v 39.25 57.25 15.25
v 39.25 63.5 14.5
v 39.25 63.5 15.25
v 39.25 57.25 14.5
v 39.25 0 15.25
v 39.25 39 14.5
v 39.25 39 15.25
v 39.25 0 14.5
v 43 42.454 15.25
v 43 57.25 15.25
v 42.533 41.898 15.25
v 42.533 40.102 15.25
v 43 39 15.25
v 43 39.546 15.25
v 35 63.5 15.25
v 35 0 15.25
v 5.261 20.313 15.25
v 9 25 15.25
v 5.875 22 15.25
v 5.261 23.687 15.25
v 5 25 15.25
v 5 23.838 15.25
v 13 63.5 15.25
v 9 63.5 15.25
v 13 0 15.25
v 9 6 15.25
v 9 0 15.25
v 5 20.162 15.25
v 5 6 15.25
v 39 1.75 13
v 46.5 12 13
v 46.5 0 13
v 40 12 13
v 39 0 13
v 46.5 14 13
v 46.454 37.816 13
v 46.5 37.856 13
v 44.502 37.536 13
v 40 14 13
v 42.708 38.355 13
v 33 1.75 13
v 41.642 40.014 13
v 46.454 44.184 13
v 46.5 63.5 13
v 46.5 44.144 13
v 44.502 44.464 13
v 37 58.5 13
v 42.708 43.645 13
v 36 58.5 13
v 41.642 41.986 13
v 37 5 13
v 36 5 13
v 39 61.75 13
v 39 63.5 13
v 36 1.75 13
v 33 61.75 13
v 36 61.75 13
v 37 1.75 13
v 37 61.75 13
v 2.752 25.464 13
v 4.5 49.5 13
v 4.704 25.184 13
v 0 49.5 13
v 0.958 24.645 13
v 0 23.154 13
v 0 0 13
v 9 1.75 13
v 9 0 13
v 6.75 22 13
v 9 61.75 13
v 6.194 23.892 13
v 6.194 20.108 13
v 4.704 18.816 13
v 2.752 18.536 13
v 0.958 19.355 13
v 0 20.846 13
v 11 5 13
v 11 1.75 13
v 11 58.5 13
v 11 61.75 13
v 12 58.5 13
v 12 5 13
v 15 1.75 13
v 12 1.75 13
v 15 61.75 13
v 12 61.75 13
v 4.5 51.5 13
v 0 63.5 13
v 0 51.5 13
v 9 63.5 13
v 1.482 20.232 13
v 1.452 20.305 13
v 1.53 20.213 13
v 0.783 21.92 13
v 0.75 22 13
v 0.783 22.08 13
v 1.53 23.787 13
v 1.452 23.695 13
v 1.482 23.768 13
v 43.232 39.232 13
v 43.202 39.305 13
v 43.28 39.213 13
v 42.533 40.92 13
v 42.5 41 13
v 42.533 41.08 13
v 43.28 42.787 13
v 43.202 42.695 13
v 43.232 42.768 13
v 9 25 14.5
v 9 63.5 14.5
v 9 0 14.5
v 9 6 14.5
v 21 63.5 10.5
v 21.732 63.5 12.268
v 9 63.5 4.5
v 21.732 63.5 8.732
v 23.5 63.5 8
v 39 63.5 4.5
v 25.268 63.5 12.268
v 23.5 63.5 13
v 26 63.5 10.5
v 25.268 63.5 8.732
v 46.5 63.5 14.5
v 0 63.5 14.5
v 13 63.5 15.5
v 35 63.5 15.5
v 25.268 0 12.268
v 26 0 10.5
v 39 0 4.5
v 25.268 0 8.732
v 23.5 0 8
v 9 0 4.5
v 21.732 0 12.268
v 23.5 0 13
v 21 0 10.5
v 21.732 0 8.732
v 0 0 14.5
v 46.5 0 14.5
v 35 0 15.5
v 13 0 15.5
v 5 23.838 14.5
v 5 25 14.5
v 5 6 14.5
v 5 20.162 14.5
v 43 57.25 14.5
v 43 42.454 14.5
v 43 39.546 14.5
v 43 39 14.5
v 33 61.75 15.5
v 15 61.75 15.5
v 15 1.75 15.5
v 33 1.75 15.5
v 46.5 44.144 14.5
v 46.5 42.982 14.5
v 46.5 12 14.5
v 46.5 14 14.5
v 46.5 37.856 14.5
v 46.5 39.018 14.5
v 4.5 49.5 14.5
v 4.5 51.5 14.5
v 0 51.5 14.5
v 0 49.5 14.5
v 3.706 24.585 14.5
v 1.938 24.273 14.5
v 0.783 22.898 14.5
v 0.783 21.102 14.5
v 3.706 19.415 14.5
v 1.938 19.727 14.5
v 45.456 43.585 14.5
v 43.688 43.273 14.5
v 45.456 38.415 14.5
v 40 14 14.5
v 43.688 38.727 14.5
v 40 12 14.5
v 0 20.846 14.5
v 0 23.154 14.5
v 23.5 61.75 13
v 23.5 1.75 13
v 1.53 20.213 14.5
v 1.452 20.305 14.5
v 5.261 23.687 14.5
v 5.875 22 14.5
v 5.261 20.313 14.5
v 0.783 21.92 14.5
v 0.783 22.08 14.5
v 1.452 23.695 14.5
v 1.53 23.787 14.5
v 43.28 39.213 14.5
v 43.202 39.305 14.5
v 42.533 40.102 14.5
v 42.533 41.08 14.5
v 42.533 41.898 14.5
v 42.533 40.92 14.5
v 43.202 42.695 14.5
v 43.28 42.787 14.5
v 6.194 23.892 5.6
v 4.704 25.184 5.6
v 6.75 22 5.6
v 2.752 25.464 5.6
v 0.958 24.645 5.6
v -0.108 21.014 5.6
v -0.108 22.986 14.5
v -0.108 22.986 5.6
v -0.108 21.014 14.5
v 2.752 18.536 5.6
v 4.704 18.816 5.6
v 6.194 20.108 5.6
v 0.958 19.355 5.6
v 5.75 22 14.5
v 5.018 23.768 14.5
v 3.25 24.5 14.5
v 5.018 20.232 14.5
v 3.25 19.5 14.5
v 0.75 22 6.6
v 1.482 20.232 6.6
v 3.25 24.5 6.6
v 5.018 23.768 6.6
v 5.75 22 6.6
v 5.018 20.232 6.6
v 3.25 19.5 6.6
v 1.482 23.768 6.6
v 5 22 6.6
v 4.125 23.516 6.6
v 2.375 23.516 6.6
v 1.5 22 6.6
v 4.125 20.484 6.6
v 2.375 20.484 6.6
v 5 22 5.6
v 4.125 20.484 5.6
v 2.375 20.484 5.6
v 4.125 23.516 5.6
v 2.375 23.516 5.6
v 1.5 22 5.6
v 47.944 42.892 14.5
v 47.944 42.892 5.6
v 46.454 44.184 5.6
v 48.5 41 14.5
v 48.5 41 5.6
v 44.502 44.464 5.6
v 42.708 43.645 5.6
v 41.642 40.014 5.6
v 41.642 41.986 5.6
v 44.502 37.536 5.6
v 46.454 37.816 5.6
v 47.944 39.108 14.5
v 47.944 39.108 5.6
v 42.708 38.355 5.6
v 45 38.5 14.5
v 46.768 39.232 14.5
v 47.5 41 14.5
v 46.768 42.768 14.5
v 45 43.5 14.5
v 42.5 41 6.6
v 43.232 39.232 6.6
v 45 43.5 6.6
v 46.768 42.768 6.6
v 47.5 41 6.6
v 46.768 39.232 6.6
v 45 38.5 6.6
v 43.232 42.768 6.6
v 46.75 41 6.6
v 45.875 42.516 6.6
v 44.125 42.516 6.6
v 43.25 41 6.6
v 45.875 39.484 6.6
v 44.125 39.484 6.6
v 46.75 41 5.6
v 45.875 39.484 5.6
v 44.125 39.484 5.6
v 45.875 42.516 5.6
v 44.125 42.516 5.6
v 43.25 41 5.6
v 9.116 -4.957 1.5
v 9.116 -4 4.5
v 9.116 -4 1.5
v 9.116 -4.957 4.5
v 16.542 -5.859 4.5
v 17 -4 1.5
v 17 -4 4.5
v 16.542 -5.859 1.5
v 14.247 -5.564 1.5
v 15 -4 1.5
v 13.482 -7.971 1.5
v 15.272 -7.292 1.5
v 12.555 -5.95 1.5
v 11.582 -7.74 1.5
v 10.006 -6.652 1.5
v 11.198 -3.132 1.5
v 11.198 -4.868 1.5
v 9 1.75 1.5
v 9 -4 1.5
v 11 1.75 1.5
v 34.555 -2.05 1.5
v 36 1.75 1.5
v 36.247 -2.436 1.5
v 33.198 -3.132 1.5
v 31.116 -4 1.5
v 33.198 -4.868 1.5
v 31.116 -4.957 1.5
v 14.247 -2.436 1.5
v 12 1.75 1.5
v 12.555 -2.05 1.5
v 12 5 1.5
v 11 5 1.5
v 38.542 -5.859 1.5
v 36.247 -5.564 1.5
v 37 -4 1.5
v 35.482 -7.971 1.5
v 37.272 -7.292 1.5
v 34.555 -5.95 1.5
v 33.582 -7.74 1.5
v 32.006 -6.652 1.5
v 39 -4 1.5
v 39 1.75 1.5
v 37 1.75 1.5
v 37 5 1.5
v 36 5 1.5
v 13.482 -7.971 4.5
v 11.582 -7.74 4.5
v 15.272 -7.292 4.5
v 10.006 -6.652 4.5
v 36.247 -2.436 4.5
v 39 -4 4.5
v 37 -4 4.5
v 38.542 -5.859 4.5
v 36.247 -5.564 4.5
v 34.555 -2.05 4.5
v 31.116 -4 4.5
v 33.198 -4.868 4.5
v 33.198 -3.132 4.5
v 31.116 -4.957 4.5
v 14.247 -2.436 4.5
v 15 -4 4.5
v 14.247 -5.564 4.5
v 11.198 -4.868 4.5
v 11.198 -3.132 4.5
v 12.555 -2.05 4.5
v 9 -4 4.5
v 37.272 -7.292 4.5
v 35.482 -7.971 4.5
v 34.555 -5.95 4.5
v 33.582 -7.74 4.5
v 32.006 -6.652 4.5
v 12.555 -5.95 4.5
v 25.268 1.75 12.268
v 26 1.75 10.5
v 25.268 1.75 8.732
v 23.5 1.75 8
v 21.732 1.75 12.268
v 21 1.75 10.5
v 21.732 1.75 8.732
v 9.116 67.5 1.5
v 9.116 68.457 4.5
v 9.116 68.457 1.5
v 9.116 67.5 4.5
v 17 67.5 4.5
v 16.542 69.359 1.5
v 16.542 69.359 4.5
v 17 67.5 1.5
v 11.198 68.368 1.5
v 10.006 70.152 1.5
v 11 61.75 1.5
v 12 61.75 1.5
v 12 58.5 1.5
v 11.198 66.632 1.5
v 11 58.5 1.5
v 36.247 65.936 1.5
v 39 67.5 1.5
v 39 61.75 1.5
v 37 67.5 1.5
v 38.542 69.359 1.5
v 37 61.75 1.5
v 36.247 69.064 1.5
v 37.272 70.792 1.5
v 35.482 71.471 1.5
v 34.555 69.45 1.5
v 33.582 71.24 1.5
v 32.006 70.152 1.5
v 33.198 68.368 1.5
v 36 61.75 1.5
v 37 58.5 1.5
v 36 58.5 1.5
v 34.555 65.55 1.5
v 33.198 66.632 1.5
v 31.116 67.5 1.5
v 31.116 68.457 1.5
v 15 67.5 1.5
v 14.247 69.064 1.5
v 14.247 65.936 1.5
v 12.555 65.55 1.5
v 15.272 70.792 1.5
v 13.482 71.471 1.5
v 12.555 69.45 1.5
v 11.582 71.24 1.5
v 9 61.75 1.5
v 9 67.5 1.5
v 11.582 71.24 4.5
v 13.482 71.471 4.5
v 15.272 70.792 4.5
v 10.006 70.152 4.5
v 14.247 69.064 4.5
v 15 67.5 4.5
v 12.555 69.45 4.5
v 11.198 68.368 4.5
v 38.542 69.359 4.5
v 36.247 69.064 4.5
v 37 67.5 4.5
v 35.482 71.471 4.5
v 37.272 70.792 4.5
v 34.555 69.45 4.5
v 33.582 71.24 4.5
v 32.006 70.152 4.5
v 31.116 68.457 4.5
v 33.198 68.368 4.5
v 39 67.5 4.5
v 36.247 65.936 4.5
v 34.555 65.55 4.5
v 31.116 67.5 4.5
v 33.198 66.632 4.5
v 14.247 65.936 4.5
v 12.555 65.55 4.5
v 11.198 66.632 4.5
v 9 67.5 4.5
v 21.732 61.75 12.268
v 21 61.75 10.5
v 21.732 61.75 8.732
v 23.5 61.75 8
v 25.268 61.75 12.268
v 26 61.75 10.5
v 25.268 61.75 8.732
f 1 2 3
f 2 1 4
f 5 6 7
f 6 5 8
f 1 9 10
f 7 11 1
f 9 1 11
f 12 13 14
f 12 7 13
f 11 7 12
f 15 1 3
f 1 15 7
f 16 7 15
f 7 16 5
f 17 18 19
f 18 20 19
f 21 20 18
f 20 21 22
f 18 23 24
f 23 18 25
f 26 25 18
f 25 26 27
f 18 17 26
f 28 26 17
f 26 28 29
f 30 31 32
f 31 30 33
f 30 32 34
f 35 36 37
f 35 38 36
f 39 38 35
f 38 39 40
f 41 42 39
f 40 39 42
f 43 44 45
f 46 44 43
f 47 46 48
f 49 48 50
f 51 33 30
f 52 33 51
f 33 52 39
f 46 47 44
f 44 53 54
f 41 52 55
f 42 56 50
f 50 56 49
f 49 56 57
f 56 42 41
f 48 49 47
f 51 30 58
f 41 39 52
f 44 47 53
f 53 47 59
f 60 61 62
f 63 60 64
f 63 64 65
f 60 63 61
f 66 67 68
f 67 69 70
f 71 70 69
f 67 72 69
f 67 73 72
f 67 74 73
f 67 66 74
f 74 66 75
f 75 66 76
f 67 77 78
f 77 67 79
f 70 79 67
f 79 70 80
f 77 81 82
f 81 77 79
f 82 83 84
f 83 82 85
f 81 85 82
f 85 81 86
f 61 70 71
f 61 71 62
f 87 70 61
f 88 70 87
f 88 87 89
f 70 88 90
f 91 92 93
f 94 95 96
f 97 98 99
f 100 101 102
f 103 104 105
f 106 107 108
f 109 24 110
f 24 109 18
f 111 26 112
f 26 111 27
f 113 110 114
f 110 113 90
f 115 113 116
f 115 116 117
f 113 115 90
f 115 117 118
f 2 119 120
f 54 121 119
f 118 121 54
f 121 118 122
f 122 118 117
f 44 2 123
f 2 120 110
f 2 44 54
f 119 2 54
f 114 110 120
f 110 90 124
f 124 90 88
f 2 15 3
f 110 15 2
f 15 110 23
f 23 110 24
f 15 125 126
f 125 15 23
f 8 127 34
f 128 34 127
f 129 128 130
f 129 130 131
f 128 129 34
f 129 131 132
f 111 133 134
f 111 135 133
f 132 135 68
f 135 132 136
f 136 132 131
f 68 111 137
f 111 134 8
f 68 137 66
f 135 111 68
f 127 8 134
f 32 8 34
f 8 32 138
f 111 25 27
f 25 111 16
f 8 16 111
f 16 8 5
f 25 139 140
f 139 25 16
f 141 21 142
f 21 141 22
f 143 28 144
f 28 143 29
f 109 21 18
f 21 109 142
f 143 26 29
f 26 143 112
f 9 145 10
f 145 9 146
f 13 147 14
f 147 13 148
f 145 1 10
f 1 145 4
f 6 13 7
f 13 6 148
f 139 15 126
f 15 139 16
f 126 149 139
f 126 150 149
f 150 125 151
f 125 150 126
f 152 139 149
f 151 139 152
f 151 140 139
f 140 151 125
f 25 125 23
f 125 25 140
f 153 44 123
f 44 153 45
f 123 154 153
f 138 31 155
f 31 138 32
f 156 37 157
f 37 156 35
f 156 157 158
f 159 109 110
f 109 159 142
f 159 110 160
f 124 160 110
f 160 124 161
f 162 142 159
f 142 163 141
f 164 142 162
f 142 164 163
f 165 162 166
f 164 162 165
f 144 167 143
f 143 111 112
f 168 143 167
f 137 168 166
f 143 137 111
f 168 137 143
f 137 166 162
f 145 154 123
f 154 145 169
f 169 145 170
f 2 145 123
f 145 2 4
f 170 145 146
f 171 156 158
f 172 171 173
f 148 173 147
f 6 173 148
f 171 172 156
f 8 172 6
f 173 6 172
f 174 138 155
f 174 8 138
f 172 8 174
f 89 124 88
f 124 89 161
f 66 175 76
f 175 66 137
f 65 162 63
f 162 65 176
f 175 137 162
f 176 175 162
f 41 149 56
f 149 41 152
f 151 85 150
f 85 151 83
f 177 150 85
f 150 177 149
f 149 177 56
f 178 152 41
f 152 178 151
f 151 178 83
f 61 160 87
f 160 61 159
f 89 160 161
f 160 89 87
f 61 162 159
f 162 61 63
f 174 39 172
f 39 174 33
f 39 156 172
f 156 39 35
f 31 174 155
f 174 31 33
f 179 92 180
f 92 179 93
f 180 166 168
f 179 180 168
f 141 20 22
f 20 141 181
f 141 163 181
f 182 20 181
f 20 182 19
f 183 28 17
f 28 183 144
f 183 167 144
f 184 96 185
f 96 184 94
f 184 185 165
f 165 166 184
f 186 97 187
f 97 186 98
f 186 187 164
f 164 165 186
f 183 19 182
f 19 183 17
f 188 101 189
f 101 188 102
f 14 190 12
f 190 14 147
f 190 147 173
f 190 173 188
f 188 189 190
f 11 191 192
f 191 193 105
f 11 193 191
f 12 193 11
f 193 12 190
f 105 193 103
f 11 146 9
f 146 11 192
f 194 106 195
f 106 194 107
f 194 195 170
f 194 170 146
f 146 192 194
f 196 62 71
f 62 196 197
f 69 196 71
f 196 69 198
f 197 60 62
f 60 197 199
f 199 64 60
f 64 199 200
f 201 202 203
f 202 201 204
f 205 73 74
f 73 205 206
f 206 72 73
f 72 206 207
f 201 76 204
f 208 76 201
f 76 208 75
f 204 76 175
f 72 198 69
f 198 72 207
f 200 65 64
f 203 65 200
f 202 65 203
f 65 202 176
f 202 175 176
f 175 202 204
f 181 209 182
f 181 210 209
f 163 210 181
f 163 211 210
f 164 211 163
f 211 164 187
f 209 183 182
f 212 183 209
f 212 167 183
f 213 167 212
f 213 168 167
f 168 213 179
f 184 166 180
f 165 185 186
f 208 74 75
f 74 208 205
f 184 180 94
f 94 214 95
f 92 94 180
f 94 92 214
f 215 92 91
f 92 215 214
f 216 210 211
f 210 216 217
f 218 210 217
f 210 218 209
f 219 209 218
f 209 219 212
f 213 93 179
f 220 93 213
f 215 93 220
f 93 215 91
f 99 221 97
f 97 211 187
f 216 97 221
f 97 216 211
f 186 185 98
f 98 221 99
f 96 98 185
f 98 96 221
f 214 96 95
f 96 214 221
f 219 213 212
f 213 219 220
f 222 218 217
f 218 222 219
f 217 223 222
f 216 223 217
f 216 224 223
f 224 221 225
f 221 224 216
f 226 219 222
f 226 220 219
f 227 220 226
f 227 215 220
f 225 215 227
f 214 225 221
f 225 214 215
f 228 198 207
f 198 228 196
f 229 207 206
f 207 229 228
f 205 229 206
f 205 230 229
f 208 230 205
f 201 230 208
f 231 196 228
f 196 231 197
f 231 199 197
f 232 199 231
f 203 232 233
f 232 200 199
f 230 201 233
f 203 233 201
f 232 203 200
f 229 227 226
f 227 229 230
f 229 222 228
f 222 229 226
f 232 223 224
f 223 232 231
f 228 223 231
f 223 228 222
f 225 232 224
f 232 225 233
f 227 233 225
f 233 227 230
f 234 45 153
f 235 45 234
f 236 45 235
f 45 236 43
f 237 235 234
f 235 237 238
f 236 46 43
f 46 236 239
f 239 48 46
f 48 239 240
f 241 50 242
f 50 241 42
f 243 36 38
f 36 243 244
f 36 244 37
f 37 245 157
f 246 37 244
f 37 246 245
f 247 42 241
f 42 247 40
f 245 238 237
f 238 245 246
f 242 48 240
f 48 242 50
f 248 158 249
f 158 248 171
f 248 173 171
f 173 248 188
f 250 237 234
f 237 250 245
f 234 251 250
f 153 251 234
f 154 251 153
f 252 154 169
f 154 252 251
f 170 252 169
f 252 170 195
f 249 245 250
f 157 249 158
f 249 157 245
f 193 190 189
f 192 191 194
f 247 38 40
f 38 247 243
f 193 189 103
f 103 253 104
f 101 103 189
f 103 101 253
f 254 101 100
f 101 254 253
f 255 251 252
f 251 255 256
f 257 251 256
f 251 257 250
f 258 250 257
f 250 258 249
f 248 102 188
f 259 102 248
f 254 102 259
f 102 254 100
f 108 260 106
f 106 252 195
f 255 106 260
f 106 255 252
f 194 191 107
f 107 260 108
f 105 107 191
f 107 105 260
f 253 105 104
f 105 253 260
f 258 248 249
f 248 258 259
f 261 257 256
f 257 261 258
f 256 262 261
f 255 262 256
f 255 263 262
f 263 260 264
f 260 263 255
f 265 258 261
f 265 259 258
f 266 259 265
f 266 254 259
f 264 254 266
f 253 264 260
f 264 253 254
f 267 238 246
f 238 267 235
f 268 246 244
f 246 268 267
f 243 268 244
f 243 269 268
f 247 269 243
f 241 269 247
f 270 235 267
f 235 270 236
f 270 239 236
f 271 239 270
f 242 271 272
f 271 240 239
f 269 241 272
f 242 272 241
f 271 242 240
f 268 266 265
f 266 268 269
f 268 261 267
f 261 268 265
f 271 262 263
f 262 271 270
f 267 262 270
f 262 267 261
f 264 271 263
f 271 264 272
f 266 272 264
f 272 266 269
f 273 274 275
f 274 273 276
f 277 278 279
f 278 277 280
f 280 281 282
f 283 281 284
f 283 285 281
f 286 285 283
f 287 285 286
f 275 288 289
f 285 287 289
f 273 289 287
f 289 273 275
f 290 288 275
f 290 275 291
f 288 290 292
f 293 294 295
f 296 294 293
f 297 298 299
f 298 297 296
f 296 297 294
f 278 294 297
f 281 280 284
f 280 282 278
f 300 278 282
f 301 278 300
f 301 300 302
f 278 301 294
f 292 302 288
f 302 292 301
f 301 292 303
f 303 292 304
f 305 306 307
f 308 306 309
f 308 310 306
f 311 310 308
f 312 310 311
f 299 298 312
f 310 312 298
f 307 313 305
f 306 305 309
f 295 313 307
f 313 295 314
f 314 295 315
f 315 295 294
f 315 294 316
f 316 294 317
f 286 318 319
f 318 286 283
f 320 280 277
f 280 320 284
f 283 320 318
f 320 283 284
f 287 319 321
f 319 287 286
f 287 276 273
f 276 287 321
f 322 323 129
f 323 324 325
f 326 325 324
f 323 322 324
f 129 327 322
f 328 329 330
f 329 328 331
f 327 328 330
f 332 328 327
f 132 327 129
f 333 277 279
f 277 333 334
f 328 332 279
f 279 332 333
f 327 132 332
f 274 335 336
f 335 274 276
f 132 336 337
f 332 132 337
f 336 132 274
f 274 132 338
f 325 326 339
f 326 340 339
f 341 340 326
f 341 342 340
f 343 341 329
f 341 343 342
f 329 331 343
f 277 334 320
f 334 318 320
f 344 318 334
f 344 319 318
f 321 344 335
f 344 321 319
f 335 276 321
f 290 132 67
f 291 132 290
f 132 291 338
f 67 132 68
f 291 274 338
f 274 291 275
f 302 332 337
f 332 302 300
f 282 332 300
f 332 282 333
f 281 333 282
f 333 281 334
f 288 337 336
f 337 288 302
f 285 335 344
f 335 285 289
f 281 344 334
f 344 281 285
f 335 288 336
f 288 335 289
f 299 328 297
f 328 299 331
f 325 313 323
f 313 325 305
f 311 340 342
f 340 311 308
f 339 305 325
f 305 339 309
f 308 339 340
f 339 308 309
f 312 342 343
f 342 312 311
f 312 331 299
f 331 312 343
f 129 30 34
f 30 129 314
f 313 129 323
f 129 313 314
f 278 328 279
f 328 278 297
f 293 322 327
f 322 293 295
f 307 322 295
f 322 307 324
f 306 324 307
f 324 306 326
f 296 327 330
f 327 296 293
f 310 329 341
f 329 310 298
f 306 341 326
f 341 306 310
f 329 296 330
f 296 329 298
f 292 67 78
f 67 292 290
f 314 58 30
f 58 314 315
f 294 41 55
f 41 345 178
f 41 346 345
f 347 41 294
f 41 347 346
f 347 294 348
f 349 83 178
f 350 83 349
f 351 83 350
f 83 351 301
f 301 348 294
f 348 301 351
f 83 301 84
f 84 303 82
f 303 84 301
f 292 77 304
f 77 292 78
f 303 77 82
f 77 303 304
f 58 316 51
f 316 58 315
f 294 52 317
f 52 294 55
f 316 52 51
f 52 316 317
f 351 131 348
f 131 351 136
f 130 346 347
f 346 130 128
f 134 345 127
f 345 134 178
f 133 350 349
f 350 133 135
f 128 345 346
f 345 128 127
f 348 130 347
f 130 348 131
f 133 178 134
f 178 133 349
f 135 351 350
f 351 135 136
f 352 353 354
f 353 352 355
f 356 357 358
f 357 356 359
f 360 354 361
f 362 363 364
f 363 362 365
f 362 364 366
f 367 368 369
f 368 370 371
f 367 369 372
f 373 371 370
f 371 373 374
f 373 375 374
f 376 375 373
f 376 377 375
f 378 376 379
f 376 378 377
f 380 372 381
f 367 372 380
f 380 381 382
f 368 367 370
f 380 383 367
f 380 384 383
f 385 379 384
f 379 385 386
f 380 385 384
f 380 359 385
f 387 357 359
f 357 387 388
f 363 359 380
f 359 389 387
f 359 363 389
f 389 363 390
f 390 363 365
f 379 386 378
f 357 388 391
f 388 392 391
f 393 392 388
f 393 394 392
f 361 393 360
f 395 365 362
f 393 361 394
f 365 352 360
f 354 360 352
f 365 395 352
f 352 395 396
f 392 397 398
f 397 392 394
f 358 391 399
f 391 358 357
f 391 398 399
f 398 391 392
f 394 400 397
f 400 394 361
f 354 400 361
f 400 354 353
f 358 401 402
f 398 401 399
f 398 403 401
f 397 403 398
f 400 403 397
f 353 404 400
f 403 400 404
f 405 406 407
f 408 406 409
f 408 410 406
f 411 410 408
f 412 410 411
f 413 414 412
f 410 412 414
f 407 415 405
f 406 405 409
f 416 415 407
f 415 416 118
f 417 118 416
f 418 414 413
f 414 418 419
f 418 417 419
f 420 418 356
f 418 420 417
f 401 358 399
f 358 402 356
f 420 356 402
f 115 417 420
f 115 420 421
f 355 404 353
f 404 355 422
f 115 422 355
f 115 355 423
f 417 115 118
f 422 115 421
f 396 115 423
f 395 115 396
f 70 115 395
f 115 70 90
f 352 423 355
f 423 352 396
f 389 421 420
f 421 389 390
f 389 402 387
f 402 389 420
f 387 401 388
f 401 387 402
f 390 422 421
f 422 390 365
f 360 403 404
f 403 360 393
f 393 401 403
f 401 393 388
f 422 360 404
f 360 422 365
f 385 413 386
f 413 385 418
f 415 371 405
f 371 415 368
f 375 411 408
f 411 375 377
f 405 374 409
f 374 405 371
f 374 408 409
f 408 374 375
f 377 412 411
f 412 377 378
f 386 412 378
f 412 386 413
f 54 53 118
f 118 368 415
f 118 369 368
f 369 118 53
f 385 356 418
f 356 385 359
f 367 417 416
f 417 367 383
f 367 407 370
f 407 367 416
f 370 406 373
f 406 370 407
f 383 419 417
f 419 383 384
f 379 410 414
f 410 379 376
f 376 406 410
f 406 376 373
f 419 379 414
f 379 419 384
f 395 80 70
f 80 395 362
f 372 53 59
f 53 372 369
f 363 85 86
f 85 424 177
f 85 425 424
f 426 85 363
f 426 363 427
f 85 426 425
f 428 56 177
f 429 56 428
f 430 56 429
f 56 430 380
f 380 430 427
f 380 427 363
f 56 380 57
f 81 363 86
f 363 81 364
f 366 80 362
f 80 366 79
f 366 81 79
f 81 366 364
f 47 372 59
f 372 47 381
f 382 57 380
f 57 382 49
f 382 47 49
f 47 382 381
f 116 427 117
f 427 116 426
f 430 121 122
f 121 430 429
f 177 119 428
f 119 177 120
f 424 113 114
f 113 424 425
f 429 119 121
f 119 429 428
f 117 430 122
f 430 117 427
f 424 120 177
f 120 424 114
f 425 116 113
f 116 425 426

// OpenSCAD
// file: screwbracket.scad
module raisedScrewHole(height) {
    difference() {
        union() {
            cylinder(height, r=4);
            translate([-4, 0, 0]) cube([8, 4, height], false);
        }
        
        // translate([0, 0, 1]) cylinder(2, r=3);
        cylinder(height, r=2);
    }
}
// main file
use <screwbracket.scad>;

module plate() {
    plateLength = 63.5;
    plateWidth = 46.5;
    plateHeight = 1.5;

    difference() {
        union() {
            translate([13, 0, 0])   color("white") cube([22, plateLength, plateHeight + 1], false);
            union() {
                translate([9, 0, 0])    color("grey") cube([30.25, plateLength, plateHeight + 0.75], false);
                translate([5, 6, 0])    color("grey") cube([4, 19, plateHeight + 0.75], false);
                translate([39, 39, 0])  color("grey") cube([4, 18.25, plateHeight + 0.75], false);
            }
            cube([plateWidth, plateLength, plateHeight], false);
        }
        translate([15, 1.75, 0]) cube([18, plateLength - 3.5, 4], false);

        translate([0, 49.5, 0]) cube([4.5, 2, plateHeight], false);
        translate([40, 12, 0]) cube([6.5, 2, plateHeight], false);
        
        translate([3.25, 22, 0]) cylinder(r=2.625, h=10, center=true);
        translate([45, 41, 0]) cylinder(r=2.625, h=10, center=true);
    }
}

module brace() {
    difference() {
        union() {
            cube([30, 1.75, 11.5], false);
            translate([2, 0, 0]) cube([1, 5, 11.5], false);
            translate([27, 0, 0]) cube([1, 5, 11.5], false);

            translate([4, -4, 8.5]) raisedScrewHole(3);
            translate([26, -4, 8.5]) raisedScrewHole(3);

            translate([8, -4, 8.5]) cube([14, 4, 3], false);
        }

        translate([14.5, 0, 2.5]) rotate([90, 90, 0]) cylinder(r=2.5, h=4, center=true);
    }

}

module screwOffset() {
    union() {
        difference() {
            cylinder(r=3.5, h=8.4, center=true);
            cylinder(r=2.5, h=8.4, center=true);
        }
        translate([0, 0, -4.2]) difference() {
            cylinder(r=3.5, h=1, center=true);
            cylinder(r=1.75, h=1, center=true);
        }
        
    }
}

translate([0, 0, 13]) {
    plate();
    translate([3.25, 22, -2.70]) screwOffset();
    translate([45, 41, -2.70]) screwOffset();
}


translate([9, 0, 13]) mirror([0, 0, 1]) union() {
    brace();
    
}
translate([9, 63.5,  13]) mirror([0, 1, 0]) mirror([0, 0, 1]) brace();
